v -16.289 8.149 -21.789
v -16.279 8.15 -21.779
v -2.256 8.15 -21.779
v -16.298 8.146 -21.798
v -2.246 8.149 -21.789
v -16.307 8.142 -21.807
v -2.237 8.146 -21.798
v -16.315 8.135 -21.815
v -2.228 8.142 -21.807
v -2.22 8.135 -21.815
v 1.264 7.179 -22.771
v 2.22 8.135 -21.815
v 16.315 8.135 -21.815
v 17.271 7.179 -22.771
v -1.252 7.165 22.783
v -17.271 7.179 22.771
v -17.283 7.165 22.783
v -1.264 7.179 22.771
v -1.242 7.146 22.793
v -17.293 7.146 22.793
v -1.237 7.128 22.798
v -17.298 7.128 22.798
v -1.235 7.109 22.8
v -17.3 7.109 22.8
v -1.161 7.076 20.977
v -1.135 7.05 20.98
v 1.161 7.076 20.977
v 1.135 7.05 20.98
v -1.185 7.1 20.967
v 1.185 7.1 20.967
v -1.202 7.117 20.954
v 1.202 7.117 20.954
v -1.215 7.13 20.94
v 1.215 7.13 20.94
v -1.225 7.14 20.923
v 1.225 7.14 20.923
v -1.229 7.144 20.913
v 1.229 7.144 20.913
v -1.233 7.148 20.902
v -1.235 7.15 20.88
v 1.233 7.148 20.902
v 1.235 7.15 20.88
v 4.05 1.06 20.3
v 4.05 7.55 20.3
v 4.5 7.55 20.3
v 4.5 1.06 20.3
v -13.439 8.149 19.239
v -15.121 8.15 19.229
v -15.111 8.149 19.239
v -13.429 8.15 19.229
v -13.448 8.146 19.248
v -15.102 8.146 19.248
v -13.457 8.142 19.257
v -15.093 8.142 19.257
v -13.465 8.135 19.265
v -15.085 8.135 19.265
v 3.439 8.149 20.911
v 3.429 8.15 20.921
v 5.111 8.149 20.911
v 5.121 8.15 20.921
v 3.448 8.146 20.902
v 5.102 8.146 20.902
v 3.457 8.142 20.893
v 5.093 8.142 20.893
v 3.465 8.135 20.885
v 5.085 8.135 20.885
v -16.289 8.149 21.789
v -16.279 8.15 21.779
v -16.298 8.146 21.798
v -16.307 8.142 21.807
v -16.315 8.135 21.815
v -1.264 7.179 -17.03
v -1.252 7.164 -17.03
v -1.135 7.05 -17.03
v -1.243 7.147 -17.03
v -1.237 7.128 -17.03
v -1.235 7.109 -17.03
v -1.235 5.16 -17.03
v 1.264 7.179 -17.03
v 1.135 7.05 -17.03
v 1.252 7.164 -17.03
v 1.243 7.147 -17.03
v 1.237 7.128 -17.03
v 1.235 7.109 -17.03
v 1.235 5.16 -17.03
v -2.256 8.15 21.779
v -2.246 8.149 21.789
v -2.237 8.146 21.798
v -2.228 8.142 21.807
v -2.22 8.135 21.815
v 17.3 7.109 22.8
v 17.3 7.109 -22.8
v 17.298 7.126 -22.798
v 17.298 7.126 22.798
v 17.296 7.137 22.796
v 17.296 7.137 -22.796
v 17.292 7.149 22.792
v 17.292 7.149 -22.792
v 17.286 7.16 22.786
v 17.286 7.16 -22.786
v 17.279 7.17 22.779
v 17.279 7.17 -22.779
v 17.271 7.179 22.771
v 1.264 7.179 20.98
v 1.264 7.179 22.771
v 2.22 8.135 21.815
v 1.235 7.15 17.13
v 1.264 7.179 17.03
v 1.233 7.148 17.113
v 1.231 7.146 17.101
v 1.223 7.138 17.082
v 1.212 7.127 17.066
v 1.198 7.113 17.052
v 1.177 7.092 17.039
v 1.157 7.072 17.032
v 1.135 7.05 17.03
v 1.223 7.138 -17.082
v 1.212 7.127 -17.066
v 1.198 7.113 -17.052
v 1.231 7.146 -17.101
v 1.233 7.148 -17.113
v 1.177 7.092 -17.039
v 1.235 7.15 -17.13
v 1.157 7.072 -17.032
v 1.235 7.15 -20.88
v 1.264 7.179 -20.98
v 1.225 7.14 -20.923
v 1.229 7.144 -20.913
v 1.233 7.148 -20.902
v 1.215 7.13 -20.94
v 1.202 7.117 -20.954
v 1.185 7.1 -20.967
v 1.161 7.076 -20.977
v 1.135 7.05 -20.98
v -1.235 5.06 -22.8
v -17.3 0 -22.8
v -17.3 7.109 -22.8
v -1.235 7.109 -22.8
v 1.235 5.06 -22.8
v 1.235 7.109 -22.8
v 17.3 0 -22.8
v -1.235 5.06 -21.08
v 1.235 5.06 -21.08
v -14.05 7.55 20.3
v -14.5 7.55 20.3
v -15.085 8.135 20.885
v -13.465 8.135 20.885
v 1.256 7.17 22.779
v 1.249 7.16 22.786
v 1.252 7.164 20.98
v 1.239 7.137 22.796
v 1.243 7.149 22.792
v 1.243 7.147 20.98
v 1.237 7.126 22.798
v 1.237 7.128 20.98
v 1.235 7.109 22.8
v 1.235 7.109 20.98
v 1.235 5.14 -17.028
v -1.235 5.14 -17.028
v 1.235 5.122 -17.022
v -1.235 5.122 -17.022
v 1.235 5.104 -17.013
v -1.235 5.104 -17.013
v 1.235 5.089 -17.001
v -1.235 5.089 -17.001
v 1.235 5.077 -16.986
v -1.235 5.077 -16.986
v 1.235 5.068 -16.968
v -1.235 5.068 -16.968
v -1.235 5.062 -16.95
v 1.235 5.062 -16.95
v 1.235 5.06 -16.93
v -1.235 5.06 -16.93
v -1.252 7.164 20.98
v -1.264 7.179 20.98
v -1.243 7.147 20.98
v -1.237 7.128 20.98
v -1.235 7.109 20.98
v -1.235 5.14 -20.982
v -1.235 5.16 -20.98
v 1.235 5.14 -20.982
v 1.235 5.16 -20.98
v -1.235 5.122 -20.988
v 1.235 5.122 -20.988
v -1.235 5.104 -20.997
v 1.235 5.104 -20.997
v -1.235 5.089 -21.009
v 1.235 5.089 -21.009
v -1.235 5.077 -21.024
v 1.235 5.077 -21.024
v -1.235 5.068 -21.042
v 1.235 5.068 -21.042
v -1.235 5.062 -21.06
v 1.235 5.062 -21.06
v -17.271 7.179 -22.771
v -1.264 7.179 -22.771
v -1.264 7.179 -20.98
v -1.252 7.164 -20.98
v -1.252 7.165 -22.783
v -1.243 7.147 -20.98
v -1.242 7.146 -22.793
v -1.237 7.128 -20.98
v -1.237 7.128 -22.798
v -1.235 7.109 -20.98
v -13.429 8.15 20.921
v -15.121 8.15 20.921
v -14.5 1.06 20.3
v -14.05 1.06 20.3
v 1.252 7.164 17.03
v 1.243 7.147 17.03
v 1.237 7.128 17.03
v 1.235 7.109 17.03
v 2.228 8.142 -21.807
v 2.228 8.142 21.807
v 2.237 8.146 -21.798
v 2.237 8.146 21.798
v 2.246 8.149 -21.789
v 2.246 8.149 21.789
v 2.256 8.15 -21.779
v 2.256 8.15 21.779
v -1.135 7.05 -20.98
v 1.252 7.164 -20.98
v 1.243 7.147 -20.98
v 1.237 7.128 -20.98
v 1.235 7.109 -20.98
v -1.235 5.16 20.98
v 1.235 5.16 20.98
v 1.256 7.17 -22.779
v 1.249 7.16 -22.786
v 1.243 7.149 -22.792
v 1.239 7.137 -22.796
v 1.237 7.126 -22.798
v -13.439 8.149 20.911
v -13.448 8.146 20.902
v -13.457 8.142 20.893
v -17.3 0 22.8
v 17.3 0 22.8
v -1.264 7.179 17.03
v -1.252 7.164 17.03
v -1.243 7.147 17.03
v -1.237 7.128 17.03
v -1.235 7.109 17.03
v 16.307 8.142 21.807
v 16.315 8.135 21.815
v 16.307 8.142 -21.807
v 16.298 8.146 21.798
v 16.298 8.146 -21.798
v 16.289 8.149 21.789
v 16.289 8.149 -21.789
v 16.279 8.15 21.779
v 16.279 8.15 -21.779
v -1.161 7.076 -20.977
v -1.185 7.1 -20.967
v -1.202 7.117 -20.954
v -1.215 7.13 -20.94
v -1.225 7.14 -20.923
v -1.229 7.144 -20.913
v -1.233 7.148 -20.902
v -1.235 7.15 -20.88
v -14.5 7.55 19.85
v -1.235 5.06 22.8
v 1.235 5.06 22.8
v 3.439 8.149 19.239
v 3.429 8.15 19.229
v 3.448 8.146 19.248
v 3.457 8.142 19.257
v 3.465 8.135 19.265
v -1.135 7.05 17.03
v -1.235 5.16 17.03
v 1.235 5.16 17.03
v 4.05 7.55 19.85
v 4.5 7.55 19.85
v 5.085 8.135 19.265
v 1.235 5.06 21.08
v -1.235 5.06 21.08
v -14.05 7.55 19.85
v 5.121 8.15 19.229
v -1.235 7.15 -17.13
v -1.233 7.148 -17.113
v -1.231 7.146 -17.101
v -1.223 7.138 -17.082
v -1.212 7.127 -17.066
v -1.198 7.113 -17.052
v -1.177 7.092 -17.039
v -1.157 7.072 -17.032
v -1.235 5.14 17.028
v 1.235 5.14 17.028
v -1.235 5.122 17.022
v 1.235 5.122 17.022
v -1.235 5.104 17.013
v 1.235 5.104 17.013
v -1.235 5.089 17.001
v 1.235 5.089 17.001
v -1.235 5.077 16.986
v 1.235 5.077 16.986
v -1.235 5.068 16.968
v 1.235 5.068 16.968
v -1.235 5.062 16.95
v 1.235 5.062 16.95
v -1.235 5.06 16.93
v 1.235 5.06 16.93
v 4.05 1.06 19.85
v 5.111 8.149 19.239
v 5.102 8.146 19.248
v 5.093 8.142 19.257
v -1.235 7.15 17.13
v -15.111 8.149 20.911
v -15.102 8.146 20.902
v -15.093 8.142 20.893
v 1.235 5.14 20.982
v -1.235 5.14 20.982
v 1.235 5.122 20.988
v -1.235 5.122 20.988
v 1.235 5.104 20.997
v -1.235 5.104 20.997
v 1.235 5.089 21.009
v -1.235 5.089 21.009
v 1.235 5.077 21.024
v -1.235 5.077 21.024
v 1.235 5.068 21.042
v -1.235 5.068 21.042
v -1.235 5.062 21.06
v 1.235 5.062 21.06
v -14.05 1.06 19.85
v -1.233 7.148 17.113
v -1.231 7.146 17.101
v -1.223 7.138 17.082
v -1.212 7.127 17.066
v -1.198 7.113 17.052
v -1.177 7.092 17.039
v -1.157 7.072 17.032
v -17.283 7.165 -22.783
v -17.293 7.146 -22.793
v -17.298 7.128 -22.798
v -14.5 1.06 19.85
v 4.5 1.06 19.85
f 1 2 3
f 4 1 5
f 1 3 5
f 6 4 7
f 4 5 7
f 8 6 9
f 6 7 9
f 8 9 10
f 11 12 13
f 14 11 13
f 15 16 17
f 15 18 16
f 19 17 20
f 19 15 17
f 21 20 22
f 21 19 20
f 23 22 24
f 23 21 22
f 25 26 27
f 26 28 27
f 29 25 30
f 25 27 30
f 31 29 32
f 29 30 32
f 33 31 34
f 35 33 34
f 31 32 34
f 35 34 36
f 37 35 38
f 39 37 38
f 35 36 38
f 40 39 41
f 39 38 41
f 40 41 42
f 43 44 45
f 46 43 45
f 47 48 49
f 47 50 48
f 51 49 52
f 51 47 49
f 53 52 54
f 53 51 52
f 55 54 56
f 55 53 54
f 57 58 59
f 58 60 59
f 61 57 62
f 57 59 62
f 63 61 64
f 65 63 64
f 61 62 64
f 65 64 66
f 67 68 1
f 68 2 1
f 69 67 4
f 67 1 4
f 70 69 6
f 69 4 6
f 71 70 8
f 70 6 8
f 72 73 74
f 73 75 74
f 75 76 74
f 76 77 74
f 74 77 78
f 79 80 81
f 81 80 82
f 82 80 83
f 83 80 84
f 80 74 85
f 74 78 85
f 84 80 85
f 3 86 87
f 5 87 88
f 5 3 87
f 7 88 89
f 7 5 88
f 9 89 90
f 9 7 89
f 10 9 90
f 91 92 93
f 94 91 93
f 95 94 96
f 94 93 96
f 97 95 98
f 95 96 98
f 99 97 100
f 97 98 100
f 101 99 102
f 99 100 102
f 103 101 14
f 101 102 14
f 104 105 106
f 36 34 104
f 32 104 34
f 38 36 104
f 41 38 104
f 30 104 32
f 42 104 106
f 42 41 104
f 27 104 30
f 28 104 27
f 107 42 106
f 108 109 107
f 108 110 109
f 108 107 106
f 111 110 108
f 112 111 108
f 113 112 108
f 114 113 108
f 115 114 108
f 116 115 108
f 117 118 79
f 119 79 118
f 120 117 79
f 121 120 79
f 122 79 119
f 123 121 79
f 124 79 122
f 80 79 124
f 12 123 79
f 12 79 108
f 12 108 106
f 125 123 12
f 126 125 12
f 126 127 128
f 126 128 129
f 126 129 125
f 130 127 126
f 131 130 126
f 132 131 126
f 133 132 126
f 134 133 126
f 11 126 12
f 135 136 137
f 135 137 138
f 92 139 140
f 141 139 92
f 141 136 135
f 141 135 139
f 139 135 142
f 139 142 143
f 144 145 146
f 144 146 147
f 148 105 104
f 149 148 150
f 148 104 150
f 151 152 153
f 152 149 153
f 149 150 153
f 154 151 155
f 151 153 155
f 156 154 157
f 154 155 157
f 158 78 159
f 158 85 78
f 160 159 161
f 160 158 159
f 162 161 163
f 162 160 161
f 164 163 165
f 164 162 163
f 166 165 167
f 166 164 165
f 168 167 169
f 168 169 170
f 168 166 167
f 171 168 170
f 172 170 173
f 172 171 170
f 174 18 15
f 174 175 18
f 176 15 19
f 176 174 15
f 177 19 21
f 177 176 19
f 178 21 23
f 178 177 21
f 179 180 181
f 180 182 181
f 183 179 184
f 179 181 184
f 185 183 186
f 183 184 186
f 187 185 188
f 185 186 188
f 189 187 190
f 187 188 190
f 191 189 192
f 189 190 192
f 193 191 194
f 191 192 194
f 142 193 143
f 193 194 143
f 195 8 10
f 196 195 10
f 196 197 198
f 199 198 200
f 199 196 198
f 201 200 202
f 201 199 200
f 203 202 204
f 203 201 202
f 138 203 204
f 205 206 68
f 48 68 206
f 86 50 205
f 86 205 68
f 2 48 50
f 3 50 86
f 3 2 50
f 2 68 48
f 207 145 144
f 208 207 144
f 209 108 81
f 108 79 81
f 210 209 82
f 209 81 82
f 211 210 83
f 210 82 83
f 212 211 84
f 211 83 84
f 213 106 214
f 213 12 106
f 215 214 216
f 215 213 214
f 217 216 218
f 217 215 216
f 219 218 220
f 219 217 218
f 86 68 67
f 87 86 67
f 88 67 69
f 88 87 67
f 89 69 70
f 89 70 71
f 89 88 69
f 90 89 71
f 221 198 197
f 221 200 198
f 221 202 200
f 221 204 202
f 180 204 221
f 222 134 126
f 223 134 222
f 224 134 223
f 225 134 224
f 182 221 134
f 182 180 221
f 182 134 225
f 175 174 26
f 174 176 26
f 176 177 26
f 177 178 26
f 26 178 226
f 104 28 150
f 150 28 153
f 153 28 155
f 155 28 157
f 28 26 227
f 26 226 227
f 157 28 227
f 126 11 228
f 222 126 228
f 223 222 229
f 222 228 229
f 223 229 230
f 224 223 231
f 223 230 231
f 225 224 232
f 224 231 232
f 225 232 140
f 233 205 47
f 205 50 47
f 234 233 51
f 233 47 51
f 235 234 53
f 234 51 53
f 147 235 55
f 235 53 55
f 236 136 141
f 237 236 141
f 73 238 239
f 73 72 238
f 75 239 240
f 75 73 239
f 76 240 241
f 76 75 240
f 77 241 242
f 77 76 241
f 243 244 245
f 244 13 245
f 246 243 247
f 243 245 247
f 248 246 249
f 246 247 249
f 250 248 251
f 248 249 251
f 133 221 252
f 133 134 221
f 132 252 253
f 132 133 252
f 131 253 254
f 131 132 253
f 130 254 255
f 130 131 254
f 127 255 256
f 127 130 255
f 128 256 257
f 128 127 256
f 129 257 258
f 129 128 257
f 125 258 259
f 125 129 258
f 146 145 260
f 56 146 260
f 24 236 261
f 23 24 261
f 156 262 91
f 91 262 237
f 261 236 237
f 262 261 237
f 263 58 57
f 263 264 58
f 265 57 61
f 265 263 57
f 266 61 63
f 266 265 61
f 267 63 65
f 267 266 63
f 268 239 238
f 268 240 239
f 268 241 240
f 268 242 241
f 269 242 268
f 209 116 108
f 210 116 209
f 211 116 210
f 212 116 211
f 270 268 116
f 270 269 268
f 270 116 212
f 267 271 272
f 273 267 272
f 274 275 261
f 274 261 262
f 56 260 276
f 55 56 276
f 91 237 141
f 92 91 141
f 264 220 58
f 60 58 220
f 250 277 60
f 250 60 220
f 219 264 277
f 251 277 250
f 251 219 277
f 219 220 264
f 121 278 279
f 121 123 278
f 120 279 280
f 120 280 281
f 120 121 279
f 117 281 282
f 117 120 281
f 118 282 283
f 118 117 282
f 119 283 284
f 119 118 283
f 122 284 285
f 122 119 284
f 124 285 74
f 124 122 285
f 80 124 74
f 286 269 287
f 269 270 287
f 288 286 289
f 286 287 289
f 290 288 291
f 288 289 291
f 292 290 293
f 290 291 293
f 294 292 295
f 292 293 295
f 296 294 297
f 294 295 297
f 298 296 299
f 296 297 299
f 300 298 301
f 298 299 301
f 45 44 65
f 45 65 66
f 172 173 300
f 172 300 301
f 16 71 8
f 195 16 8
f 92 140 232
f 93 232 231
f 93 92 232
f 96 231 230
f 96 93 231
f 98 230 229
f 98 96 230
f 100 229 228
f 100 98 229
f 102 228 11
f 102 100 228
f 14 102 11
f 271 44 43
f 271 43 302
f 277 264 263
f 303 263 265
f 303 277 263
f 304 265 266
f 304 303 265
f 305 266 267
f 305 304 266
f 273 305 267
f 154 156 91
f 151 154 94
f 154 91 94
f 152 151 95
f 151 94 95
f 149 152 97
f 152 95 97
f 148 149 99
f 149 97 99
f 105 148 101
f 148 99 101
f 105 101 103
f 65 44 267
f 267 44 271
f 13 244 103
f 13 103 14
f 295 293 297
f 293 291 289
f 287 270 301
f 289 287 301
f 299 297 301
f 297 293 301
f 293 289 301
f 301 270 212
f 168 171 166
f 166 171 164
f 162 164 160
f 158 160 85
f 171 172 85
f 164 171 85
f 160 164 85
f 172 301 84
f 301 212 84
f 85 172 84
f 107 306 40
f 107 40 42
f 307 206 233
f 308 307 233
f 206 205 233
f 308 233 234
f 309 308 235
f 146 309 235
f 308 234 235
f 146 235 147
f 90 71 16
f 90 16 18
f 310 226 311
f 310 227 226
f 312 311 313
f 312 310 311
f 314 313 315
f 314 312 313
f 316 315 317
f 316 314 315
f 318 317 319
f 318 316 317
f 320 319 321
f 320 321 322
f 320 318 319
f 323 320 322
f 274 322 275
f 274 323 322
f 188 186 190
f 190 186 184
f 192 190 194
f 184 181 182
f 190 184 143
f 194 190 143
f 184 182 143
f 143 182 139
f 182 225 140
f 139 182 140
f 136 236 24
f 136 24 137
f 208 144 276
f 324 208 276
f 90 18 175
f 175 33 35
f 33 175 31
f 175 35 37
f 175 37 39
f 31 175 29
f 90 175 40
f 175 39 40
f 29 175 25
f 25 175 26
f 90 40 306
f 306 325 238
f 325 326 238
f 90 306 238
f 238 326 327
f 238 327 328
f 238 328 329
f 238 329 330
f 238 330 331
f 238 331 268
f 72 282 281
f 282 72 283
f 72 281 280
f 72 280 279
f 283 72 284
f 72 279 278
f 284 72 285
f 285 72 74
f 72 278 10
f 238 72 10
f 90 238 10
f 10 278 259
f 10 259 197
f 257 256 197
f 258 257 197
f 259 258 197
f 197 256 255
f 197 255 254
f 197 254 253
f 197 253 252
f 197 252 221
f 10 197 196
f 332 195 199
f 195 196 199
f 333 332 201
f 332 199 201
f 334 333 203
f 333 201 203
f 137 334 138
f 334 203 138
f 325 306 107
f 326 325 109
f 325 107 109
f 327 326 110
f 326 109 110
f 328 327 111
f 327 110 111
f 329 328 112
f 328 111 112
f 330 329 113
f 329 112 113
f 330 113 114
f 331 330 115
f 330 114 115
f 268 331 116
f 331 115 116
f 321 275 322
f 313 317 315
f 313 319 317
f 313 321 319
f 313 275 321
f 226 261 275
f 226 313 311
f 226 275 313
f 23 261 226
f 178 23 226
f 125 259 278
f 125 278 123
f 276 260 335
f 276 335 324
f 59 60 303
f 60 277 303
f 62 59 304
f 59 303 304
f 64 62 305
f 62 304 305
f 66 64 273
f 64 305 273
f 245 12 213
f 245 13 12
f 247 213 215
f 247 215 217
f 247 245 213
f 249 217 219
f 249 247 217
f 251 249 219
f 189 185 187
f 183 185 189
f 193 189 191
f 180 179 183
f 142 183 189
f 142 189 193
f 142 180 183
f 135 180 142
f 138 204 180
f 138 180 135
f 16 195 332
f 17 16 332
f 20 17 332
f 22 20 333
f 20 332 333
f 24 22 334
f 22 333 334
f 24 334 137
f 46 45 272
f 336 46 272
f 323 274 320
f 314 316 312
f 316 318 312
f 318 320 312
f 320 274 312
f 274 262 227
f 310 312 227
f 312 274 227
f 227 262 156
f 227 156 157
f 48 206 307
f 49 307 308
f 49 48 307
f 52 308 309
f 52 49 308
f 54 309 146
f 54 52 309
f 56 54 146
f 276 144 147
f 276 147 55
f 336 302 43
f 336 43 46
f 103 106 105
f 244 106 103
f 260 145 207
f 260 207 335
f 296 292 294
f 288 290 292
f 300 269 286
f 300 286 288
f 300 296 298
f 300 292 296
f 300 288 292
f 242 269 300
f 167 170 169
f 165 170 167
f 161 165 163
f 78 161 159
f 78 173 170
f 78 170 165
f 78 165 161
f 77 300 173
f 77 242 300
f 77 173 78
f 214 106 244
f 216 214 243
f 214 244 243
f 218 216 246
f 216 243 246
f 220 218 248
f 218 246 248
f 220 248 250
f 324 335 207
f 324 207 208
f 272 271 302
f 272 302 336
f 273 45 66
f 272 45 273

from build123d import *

# Parameters (mm, degrees)
SKETCH1_W           = 34.6
SKETCH1_H           = 45.6
BOSS_EXTRUDE1_DEPTH = 8.15
SKETCH2_W           = 2.47
SKETCH2_H           = 45.6
CUT_EXTRUDE1_DEPTH  = 3.09
CHAMFER1_SIZE       = 1
SKETCH3_W           = 2.47
SKETCH3_H           = 3.95
BOSS_EXTRUDE2_DEPTH = 2.09
SKETCH4_W           = 0.45
SKETCH4_H           = 0.45
CUT_EXTRUDE2_DEPTH  = 7.09
CHAMFER2_SIZE       = 0.6
FILLET2_R           = 0.05
FILLET3_R           = 0.1
FILLET4_R           = 0.1


with BuildPart() as part:
    # Sketch1 → Boss-Extrude1 (new body)
    with BuildSketch(Plane(origin=(0, 0, 0), x_dir=(1, 0, 0), z_dir=(0, 1, 0))):
        Rectangle(SKETCH1_W, SKETCH1_H)
    extrude(amount=BOSS_EXTRUDE1_DEPTH)

    # Sketch2 → Cut-Extrude1 (cut)
    with BuildSketch(Plane(origin=(0, 8.15, 0), x_dir=(1, 0, 0), z_dir=(0, 1, 0))):
        Rectangle(SKETCH2_W, SKETCH2_H)
    extrude(amount=-CUT_EXTRUDE1_DEPTH, mode=Mode.SUBTRACT)

    # Chamfer1
    chamfer1_edges = [part.edges().sort_by_distance(p)[0] for p in [
        (-17.3, 8.15, 0),
        (-9.2675, 8.15, 22.8),
        (-9.2675, 8.15, -22.8),
        (9.2675, 8.15, 22.8),
        (1.235, 8.15, 0),
        (-1.235, 8.15, 0),
        (17.3, 8.15, 0),
        (9.2675, 8.15, -22.8),
    ]]
    chamfer(chamfer1_edges, length=CHAMFER1_SIZE)

    # Sketch3 → Boss-Extrude2 (add)
    with BuildSketch(Plane(origin=(0, 5.06, 0), x_dir=(1, 0, 0), z_dir=(0, 1, 0))):
        with Locations((0, 19.005)):
            Rectangle(SKETCH3_W, SKETCH3_H)
        with Locations((0, -19.005)):
            Rectangle(SKETCH3_W, SKETCH3_H)
    extrude(amount=BOSS_EXTRUDE2_DEPTH)

    # Sketch4 → Cut-Extrude2 (cut)
    with BuildSketch(Plane(origin=(0, 8.15, 0), x_dir=(1, 0, 0), z_dir=(0, 1, 0))):
        with Locations((-14.275, -20.075)):
            Rectangle(SKETCH4_W, SKETCH4_H)
        with Locations((4.275, -20.075)):
            Rectangle(SKETCH4_W, SKETCH4_H)
    extrude(amount=-CUT_EXTRUDE2_DEPTH, mode=Mode.SUBTRACT)

    # Chamfer2
    chamfer2_edges = [part.edges().sort_by_distance(p)[0] for p in [
        (-14.05, 8.15, 20.075),
        (-14.275, 8.15, 19.85),
        (-14.5, 8.15, 20.075),
        (-14.275, 8.15, 20.3),
        (4.275, 8.15, 19.85),
        (4.05, 8.15, 20.075),
        (4.275, 8.15, 20.3),
        (4.5, 8.15, 20.075),
    ]]
    chamfer(chamfer2_edges, length=CHAMFER2_SIZE)

    # Fillet2
    fillet2_edges = [part.edges().sort_by_distance(p)[0] for p in [
        (2.235, 8.15, 0),
        (9.2675, 8.15, 21.8),
        (16.3, 8.15, 0),
        (9.2675, 8.15, -21.8),
        (-2.235, 8.15, 0),
        (-9.2675, 8.15, -21.8),
        (-16.3, 8.15, 0),
        (-9.2675, 8.15, 21.8),
        (3.45, 8.15, 20.075),
        (4.275, 8.15, 19.25),
        (5.1, 8.15, 20.075),
        (4.275, 8.15, 20.9),
        (-14.275, 8.15, 19.25),
        (-15.1, 8.15, 20.075),
        (-13.45, 8.15, 20.075),
        (-14.275, 8.15, 20.9),
    ]]
    fillet(fillet2_edges, radius=FILLET2_R)

    # Fillet3
    fillet3_edges = [part.edges().sort_by_distance(p)[0] for p in [
        (-9.2675, 7.15, -22.8),
        (9.2675, 7.15, -22.8),
        (17.3, 7.15, 0),
        (-9.2675, 7.15, 22.8),
        (9.2675, 7.15, 22.8),
        (1.235, 7.15, 21.89),
        (-17.3, 7.15, 0),
        (-1.235, 7.15, -21.89),
        (-1.235, 7.15, 0),
        (1.235, 7.15, -21.89),
        (-1.235, 7.15, 21.89),
        (1.235, 7.15, 0),
    ]]
    fillet(fillet3_edges, radius=FILLET3_R)

    # Fillet4
    fillet4_edges = [part.edges().sort_by_distance(p)[0] for p in [
        (0, 5.06, -20.98),
        (0, 5.06, -17.03),
        (0, 7.15, -20.98),
        (0, 7.15, -17.03),
        (0, 5.06, 17.03),
        (0, 5.06, 20.98),
        (0, 7.15, 17.03),
        (0, 7.15, 20.98),
    ]]
    fillet(fillet4_edges, radius=FILLET4_R)


solid = part.part
